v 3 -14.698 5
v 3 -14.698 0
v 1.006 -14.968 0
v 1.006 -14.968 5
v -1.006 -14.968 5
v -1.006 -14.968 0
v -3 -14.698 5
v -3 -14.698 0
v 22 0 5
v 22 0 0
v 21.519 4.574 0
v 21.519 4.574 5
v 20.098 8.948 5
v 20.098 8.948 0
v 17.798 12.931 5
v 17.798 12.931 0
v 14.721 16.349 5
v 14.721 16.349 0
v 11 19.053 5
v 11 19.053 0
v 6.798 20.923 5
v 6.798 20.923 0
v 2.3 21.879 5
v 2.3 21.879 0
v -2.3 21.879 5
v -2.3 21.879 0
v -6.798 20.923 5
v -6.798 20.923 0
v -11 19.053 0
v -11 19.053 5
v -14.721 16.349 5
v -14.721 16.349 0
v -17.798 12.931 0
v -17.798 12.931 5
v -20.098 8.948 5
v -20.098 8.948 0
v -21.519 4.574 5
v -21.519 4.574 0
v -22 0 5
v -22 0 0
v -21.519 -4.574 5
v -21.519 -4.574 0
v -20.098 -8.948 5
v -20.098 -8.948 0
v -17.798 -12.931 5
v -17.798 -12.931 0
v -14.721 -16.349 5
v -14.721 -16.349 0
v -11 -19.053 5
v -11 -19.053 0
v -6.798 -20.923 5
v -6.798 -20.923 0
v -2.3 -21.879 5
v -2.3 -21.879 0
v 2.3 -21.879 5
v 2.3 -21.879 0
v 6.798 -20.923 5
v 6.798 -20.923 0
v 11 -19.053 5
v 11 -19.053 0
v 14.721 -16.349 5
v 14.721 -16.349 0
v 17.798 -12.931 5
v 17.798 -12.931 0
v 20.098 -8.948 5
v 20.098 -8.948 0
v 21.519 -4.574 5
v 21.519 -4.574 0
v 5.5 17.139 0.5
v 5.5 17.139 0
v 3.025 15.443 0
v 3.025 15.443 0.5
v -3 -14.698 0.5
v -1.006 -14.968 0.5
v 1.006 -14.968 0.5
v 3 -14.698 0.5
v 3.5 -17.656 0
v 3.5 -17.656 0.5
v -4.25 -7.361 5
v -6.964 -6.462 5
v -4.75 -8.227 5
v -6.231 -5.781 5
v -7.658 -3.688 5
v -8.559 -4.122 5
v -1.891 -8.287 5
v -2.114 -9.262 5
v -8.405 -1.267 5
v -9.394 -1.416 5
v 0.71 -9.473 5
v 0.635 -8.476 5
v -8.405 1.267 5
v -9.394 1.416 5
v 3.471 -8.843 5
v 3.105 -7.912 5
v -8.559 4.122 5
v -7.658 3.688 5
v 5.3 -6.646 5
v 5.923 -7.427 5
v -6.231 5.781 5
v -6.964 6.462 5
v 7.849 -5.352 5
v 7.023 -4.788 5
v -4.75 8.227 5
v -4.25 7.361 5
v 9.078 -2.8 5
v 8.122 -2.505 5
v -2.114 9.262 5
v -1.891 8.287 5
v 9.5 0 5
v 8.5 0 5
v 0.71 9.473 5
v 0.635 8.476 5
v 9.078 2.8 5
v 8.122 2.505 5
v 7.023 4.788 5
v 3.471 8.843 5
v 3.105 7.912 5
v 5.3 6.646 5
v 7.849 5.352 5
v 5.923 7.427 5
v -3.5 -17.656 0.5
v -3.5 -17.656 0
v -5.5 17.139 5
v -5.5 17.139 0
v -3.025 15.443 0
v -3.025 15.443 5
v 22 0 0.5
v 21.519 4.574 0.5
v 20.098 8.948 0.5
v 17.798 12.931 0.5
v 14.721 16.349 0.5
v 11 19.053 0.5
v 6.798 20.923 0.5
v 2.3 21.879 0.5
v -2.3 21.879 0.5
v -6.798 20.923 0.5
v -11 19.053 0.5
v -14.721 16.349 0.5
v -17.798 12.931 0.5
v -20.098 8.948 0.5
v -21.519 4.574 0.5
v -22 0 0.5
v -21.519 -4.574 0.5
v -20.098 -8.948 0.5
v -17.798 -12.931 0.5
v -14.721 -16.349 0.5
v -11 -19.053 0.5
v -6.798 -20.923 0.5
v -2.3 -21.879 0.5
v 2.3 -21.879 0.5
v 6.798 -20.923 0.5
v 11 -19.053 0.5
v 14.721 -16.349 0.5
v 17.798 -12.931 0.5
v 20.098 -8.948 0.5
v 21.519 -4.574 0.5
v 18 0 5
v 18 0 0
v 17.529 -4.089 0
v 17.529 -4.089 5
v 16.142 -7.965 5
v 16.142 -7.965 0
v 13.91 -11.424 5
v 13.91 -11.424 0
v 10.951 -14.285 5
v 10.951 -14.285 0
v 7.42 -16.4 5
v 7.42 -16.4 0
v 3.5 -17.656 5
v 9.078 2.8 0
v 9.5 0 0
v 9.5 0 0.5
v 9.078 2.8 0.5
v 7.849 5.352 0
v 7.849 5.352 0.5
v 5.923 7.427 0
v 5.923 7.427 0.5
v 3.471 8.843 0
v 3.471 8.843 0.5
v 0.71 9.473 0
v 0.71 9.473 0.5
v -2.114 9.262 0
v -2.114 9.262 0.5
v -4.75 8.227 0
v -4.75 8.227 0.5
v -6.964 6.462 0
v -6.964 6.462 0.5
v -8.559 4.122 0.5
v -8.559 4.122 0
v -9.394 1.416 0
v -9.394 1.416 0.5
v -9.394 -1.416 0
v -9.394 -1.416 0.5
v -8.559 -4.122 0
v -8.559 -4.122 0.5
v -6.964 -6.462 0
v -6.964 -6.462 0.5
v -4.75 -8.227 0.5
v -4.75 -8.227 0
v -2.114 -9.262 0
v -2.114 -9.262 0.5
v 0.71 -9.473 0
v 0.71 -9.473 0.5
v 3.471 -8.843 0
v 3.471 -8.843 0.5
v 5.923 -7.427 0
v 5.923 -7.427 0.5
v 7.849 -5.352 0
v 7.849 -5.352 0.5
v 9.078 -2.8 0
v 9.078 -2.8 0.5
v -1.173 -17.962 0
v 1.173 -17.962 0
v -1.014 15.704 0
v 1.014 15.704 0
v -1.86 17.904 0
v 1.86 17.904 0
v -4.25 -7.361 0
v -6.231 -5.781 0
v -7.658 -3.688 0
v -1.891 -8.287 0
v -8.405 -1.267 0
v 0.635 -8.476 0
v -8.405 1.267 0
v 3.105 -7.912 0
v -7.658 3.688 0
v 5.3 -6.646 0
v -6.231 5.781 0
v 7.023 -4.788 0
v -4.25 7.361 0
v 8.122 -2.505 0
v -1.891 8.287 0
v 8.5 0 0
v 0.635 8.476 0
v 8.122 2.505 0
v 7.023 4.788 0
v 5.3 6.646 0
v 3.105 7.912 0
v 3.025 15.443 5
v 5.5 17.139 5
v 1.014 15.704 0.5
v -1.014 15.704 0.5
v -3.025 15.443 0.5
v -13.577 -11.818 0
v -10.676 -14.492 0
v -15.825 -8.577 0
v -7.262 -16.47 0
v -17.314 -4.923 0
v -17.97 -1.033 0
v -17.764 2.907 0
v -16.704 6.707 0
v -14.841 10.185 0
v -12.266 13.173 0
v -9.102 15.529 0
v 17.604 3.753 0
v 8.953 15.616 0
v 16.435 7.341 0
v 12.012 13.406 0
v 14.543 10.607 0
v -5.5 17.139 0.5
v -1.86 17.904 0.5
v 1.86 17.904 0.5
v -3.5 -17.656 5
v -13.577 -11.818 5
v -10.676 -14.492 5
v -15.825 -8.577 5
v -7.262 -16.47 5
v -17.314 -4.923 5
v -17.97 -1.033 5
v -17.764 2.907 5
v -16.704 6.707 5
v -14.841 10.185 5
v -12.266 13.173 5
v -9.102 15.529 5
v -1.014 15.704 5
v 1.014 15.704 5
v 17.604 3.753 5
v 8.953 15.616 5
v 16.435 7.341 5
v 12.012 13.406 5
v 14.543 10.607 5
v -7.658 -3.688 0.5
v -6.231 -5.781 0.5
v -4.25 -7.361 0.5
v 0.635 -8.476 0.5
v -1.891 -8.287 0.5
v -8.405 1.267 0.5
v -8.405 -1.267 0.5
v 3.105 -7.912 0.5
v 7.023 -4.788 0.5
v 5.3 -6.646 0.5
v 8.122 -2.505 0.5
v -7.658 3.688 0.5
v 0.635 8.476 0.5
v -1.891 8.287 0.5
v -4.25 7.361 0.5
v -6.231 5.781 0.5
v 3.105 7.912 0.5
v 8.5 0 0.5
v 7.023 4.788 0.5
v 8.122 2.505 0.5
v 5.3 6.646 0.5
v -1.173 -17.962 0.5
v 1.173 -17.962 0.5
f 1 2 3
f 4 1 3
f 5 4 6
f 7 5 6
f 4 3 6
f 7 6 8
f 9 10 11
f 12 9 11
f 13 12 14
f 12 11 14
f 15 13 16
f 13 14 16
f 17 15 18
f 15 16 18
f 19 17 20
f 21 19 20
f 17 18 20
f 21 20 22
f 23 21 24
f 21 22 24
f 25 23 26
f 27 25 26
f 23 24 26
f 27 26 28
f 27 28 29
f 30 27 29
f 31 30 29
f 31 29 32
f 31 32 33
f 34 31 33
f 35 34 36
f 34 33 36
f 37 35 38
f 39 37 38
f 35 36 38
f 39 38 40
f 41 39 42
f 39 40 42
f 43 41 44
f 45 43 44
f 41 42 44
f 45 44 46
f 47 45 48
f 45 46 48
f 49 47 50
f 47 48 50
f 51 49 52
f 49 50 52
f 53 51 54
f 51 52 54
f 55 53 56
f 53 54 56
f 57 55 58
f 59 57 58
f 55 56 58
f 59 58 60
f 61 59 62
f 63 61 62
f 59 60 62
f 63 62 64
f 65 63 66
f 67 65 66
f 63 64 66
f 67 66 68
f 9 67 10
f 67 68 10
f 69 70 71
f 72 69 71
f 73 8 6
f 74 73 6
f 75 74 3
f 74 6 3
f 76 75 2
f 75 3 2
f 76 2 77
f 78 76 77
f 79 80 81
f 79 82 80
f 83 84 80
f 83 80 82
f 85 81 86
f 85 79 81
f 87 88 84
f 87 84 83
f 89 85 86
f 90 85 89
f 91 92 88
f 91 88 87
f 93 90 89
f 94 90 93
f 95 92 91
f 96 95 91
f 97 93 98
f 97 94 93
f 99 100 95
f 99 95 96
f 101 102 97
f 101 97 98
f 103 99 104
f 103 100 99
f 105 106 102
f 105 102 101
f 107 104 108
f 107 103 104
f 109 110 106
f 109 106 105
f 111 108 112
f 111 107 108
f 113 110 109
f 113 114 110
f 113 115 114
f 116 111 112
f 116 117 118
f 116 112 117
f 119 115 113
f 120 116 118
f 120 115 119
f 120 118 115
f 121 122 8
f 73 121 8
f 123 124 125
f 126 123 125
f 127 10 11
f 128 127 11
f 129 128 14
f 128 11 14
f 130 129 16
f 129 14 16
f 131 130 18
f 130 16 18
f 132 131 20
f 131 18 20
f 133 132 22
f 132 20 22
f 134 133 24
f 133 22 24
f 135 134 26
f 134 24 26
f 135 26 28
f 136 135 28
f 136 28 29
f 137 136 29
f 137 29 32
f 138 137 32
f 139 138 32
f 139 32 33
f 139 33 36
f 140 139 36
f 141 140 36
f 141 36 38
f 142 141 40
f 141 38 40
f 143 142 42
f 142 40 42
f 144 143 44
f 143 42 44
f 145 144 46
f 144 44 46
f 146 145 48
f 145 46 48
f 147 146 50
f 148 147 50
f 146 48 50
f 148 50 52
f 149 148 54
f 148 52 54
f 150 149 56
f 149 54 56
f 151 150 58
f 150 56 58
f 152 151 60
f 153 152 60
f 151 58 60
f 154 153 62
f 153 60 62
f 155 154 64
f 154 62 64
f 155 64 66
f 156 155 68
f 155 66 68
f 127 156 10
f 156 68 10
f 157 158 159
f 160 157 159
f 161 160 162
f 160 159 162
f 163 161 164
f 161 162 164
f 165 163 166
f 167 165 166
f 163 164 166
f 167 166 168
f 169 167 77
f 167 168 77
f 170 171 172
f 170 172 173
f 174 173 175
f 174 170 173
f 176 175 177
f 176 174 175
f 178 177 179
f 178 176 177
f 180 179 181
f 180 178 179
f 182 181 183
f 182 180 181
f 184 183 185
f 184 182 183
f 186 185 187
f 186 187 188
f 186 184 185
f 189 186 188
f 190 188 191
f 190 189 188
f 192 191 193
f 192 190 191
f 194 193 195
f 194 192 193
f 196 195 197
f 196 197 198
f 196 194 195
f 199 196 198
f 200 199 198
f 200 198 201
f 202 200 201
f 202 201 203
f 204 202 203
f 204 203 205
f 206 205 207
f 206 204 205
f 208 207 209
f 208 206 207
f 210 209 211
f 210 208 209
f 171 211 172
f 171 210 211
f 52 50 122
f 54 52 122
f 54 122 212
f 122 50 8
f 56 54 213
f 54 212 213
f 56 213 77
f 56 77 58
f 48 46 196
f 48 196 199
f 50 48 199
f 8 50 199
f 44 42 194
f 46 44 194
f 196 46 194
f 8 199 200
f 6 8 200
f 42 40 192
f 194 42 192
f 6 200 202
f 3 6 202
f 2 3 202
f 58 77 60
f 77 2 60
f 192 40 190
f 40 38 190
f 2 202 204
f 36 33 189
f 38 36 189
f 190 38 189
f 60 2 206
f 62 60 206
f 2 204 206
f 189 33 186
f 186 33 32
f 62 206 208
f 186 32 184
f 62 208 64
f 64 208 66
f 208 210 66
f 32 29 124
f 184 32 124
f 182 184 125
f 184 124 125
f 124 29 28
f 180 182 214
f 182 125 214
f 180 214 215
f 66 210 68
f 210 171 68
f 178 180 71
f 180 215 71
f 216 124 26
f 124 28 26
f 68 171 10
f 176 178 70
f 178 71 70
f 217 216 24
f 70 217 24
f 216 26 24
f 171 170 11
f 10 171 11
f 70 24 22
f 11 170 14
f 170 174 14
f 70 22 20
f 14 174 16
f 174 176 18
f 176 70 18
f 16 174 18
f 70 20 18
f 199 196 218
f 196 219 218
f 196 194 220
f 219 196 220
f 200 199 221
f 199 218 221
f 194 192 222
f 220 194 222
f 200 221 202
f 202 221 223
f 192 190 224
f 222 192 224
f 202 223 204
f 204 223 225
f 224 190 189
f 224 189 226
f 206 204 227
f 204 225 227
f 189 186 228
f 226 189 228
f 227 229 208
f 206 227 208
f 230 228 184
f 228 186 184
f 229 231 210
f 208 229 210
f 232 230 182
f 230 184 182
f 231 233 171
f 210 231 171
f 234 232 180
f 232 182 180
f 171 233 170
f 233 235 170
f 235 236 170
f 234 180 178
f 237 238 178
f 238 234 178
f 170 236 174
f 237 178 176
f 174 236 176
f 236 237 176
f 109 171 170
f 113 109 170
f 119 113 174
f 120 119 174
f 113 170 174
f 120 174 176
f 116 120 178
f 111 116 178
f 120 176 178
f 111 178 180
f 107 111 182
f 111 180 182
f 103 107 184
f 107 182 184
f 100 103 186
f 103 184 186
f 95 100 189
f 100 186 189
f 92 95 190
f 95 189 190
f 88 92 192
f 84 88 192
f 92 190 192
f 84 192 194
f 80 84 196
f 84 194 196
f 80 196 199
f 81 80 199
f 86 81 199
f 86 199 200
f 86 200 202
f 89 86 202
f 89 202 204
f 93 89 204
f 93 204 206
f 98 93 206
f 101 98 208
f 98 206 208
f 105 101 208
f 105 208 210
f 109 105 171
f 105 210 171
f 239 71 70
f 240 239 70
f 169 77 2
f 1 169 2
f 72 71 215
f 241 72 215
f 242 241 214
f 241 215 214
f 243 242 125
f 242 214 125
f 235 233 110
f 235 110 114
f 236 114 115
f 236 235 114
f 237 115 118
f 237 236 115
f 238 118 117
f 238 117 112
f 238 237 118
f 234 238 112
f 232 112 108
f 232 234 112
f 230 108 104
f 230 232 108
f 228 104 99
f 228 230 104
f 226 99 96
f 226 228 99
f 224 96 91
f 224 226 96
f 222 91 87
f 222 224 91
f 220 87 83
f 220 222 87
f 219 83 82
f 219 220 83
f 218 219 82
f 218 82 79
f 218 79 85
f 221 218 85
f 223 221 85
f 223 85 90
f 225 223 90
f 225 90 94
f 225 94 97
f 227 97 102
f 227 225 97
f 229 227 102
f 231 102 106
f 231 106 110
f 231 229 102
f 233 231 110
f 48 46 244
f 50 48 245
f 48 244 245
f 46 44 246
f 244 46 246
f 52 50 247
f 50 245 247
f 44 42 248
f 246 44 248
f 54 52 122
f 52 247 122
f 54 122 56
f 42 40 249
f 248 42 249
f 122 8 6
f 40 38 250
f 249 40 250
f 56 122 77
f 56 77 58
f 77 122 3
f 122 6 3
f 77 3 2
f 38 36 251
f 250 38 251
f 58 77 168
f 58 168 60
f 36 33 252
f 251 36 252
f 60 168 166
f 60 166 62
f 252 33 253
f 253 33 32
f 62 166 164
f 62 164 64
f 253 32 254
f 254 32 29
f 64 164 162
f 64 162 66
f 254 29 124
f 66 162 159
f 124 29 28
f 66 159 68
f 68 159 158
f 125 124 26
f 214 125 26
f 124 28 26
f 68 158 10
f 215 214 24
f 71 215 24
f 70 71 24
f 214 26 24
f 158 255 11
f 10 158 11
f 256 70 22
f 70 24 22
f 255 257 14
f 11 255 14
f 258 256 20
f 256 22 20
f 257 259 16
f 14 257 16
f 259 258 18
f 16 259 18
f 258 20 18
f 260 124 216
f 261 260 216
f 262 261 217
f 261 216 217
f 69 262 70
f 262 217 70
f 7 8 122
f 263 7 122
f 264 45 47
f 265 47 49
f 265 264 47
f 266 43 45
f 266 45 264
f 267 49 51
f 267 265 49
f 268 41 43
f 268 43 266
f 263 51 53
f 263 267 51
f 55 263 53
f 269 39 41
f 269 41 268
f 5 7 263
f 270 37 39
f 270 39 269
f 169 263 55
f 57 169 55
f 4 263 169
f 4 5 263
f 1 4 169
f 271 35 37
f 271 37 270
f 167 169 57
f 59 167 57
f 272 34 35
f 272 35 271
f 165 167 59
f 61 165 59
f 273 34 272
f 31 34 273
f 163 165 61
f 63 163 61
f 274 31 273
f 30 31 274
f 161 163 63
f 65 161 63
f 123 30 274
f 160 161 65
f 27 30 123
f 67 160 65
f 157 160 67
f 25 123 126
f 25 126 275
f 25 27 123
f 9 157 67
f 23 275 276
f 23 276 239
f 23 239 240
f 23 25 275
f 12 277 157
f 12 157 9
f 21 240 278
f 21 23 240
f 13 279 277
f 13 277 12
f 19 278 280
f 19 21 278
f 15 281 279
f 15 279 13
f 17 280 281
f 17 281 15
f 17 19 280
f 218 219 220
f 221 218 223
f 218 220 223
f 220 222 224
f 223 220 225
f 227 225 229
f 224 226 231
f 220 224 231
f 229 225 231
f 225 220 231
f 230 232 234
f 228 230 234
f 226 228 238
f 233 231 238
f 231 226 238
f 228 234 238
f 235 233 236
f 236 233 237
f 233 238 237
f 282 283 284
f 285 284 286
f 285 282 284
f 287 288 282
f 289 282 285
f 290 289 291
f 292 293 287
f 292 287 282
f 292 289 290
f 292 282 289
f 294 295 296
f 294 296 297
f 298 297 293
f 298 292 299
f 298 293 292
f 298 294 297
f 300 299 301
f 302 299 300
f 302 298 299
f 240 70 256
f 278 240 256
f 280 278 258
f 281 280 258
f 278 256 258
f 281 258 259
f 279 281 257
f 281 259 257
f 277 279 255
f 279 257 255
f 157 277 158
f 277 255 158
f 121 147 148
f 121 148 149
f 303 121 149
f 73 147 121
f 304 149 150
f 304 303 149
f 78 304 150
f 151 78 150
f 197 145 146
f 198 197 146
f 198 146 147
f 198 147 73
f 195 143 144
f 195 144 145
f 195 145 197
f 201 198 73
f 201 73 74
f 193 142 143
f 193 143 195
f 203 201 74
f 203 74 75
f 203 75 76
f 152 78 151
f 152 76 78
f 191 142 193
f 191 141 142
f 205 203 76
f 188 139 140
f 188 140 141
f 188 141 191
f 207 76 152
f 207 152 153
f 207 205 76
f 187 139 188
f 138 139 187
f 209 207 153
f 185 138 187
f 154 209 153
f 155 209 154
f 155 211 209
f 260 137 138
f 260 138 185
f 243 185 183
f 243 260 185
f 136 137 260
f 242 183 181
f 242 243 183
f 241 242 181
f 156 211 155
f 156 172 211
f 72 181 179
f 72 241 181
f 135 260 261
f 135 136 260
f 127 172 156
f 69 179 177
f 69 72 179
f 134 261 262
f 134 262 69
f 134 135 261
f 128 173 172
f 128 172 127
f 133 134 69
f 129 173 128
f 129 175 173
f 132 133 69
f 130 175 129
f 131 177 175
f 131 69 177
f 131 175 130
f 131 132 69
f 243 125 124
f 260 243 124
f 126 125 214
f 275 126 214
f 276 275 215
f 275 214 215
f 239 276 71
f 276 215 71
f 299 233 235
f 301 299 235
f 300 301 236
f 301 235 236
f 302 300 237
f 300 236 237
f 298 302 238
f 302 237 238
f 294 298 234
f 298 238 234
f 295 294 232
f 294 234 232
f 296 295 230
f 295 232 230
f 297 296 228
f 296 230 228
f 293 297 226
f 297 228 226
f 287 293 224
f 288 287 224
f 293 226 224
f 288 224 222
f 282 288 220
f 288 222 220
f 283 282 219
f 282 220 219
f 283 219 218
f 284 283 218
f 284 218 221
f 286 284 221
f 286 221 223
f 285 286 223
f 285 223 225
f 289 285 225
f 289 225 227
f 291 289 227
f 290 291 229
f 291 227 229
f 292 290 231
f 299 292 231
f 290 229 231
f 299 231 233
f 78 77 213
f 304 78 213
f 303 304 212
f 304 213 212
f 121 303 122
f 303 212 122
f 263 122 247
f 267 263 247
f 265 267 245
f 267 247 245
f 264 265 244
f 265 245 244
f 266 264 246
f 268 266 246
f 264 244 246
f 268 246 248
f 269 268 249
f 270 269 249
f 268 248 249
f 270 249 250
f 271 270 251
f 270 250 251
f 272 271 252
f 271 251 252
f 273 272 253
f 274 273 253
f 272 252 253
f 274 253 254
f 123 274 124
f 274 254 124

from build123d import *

# Parameters (mm, degrees)
F0_R     = 22
F0_R_2   = 9.5
F0_R_3   = 8.5
F1_DEPTH = 5
F2_DEPTH = 0.5


with BuildPart() as f1:
    # F0 (on Top) → F1 (new body)
    with BuildSketch(Plane.XY):
        Circle(F0_R)
        with BuildLine():
            ThreePointArc((5.5, 17.139137), (14.54304, 10.606602), (18, 0))
            ThreePointArc((18, 0), (13.910428, -11.42366), (3.5, -17.656444))
            ThreePointArc((3.5, -17.656444), (0, -18), (-3.5, -17.656444))
            ThreePointArc((-3.5, -17.656444), (-17.970339, -1.032909), (-5.5, 17.139137))
            ThreePointArc((-5.5, 17.139137), (0, 18), (5.5, 17.139137))
        make_face(mode=Mode.SUBTRACT)
        with BuildLine():
            Line((3.025386, 15.443175), (5.5, 17.139137))
            ThreePointArc((5.5, 17.139137), (0, 18), (-5.5, 17.139137))
            Line((-5.5, 17.139137), (-3.025386, 15.443175))
            ThreePointArc((-3.025386, 15.443175), (0, 15.736728), (3.025386, 15.443175))
        make_face()
        with BuildLine():
            ThreePointArc((-3.5, -17.656444), (0, -18), (3.5, -17.656444))
            Line((3.5, -17.656444), (3, -14.698404))
            ThreePointArc((3, -14.698404), (0, -15.001436), (-3, -14.698404))
            Line((-3, -14.698404), (-3.5, -17.656444))
        make_face()
        Circle(F0_R_2)
        Circle(F0_R_3, mode=Mode.SUBTRACT)
    extrude(amount=F1_DEPTH)


with BuildPart() as f2:
    # F0 (on Top) → F2 (new body)
    with BuildSketch(Plane.XY):
        Circle(F0_R)
        with BuildLine():
            ThreePointArc((5.5, 17.139137), (14.54304, 10.606602), (18, 0))
            ThreePointArc((18, 0), (13.910428, -11.42366), (3.5, -17.656444))
            ThreePointArc((3.5, -17.656444), (0, -18), (-3.5, -17.656444))
            ThreePointArc((-3.5, -17.656444), (-17.970339, -1.032909), (-5.5, 17.139137))
            ThreePointArc((-5.5, 17.139137), (0, 18), (5.5, 17.139137))
        make_face(mode=Mode.SUBTRACT)
        with BuildLine():
            ThreePointArc((3.5, -17.656444), (13.910428, -11.42366), (18, 0))
            ThreePointArc((18, 0), (14.54304, 10.606602), (5.5, 17.139137))
            Line((5.5, 17.139137), (3.025386, 15.443175))
            ThreePointArc((3.025386, 15.443175), (0, 15.736728), (-3.025386, 15.443175))
            Line((-3.025386, 15.443175), (-5.5, 17.139137))
            ThreePointArc((-5.5, 17.139137), (-17.970339, -1.032909), (-3.5, -17.656444))
            Line((-3.5, -17.656444), (-3, -14.698404))
            ThreePointArc((-3, -14.698404), (0, -15.001436), (3, -14.698404))
            Line((3, -14.698404), (3.5, -17.656444))
        make_face()
        Circle(F0_R_2, mode=Mode.SUBTRACT)
        Circle(F0_R_3)
    extrude(amount=F2_DEPTH)


solid = Compound([f1.part, f2.part])
